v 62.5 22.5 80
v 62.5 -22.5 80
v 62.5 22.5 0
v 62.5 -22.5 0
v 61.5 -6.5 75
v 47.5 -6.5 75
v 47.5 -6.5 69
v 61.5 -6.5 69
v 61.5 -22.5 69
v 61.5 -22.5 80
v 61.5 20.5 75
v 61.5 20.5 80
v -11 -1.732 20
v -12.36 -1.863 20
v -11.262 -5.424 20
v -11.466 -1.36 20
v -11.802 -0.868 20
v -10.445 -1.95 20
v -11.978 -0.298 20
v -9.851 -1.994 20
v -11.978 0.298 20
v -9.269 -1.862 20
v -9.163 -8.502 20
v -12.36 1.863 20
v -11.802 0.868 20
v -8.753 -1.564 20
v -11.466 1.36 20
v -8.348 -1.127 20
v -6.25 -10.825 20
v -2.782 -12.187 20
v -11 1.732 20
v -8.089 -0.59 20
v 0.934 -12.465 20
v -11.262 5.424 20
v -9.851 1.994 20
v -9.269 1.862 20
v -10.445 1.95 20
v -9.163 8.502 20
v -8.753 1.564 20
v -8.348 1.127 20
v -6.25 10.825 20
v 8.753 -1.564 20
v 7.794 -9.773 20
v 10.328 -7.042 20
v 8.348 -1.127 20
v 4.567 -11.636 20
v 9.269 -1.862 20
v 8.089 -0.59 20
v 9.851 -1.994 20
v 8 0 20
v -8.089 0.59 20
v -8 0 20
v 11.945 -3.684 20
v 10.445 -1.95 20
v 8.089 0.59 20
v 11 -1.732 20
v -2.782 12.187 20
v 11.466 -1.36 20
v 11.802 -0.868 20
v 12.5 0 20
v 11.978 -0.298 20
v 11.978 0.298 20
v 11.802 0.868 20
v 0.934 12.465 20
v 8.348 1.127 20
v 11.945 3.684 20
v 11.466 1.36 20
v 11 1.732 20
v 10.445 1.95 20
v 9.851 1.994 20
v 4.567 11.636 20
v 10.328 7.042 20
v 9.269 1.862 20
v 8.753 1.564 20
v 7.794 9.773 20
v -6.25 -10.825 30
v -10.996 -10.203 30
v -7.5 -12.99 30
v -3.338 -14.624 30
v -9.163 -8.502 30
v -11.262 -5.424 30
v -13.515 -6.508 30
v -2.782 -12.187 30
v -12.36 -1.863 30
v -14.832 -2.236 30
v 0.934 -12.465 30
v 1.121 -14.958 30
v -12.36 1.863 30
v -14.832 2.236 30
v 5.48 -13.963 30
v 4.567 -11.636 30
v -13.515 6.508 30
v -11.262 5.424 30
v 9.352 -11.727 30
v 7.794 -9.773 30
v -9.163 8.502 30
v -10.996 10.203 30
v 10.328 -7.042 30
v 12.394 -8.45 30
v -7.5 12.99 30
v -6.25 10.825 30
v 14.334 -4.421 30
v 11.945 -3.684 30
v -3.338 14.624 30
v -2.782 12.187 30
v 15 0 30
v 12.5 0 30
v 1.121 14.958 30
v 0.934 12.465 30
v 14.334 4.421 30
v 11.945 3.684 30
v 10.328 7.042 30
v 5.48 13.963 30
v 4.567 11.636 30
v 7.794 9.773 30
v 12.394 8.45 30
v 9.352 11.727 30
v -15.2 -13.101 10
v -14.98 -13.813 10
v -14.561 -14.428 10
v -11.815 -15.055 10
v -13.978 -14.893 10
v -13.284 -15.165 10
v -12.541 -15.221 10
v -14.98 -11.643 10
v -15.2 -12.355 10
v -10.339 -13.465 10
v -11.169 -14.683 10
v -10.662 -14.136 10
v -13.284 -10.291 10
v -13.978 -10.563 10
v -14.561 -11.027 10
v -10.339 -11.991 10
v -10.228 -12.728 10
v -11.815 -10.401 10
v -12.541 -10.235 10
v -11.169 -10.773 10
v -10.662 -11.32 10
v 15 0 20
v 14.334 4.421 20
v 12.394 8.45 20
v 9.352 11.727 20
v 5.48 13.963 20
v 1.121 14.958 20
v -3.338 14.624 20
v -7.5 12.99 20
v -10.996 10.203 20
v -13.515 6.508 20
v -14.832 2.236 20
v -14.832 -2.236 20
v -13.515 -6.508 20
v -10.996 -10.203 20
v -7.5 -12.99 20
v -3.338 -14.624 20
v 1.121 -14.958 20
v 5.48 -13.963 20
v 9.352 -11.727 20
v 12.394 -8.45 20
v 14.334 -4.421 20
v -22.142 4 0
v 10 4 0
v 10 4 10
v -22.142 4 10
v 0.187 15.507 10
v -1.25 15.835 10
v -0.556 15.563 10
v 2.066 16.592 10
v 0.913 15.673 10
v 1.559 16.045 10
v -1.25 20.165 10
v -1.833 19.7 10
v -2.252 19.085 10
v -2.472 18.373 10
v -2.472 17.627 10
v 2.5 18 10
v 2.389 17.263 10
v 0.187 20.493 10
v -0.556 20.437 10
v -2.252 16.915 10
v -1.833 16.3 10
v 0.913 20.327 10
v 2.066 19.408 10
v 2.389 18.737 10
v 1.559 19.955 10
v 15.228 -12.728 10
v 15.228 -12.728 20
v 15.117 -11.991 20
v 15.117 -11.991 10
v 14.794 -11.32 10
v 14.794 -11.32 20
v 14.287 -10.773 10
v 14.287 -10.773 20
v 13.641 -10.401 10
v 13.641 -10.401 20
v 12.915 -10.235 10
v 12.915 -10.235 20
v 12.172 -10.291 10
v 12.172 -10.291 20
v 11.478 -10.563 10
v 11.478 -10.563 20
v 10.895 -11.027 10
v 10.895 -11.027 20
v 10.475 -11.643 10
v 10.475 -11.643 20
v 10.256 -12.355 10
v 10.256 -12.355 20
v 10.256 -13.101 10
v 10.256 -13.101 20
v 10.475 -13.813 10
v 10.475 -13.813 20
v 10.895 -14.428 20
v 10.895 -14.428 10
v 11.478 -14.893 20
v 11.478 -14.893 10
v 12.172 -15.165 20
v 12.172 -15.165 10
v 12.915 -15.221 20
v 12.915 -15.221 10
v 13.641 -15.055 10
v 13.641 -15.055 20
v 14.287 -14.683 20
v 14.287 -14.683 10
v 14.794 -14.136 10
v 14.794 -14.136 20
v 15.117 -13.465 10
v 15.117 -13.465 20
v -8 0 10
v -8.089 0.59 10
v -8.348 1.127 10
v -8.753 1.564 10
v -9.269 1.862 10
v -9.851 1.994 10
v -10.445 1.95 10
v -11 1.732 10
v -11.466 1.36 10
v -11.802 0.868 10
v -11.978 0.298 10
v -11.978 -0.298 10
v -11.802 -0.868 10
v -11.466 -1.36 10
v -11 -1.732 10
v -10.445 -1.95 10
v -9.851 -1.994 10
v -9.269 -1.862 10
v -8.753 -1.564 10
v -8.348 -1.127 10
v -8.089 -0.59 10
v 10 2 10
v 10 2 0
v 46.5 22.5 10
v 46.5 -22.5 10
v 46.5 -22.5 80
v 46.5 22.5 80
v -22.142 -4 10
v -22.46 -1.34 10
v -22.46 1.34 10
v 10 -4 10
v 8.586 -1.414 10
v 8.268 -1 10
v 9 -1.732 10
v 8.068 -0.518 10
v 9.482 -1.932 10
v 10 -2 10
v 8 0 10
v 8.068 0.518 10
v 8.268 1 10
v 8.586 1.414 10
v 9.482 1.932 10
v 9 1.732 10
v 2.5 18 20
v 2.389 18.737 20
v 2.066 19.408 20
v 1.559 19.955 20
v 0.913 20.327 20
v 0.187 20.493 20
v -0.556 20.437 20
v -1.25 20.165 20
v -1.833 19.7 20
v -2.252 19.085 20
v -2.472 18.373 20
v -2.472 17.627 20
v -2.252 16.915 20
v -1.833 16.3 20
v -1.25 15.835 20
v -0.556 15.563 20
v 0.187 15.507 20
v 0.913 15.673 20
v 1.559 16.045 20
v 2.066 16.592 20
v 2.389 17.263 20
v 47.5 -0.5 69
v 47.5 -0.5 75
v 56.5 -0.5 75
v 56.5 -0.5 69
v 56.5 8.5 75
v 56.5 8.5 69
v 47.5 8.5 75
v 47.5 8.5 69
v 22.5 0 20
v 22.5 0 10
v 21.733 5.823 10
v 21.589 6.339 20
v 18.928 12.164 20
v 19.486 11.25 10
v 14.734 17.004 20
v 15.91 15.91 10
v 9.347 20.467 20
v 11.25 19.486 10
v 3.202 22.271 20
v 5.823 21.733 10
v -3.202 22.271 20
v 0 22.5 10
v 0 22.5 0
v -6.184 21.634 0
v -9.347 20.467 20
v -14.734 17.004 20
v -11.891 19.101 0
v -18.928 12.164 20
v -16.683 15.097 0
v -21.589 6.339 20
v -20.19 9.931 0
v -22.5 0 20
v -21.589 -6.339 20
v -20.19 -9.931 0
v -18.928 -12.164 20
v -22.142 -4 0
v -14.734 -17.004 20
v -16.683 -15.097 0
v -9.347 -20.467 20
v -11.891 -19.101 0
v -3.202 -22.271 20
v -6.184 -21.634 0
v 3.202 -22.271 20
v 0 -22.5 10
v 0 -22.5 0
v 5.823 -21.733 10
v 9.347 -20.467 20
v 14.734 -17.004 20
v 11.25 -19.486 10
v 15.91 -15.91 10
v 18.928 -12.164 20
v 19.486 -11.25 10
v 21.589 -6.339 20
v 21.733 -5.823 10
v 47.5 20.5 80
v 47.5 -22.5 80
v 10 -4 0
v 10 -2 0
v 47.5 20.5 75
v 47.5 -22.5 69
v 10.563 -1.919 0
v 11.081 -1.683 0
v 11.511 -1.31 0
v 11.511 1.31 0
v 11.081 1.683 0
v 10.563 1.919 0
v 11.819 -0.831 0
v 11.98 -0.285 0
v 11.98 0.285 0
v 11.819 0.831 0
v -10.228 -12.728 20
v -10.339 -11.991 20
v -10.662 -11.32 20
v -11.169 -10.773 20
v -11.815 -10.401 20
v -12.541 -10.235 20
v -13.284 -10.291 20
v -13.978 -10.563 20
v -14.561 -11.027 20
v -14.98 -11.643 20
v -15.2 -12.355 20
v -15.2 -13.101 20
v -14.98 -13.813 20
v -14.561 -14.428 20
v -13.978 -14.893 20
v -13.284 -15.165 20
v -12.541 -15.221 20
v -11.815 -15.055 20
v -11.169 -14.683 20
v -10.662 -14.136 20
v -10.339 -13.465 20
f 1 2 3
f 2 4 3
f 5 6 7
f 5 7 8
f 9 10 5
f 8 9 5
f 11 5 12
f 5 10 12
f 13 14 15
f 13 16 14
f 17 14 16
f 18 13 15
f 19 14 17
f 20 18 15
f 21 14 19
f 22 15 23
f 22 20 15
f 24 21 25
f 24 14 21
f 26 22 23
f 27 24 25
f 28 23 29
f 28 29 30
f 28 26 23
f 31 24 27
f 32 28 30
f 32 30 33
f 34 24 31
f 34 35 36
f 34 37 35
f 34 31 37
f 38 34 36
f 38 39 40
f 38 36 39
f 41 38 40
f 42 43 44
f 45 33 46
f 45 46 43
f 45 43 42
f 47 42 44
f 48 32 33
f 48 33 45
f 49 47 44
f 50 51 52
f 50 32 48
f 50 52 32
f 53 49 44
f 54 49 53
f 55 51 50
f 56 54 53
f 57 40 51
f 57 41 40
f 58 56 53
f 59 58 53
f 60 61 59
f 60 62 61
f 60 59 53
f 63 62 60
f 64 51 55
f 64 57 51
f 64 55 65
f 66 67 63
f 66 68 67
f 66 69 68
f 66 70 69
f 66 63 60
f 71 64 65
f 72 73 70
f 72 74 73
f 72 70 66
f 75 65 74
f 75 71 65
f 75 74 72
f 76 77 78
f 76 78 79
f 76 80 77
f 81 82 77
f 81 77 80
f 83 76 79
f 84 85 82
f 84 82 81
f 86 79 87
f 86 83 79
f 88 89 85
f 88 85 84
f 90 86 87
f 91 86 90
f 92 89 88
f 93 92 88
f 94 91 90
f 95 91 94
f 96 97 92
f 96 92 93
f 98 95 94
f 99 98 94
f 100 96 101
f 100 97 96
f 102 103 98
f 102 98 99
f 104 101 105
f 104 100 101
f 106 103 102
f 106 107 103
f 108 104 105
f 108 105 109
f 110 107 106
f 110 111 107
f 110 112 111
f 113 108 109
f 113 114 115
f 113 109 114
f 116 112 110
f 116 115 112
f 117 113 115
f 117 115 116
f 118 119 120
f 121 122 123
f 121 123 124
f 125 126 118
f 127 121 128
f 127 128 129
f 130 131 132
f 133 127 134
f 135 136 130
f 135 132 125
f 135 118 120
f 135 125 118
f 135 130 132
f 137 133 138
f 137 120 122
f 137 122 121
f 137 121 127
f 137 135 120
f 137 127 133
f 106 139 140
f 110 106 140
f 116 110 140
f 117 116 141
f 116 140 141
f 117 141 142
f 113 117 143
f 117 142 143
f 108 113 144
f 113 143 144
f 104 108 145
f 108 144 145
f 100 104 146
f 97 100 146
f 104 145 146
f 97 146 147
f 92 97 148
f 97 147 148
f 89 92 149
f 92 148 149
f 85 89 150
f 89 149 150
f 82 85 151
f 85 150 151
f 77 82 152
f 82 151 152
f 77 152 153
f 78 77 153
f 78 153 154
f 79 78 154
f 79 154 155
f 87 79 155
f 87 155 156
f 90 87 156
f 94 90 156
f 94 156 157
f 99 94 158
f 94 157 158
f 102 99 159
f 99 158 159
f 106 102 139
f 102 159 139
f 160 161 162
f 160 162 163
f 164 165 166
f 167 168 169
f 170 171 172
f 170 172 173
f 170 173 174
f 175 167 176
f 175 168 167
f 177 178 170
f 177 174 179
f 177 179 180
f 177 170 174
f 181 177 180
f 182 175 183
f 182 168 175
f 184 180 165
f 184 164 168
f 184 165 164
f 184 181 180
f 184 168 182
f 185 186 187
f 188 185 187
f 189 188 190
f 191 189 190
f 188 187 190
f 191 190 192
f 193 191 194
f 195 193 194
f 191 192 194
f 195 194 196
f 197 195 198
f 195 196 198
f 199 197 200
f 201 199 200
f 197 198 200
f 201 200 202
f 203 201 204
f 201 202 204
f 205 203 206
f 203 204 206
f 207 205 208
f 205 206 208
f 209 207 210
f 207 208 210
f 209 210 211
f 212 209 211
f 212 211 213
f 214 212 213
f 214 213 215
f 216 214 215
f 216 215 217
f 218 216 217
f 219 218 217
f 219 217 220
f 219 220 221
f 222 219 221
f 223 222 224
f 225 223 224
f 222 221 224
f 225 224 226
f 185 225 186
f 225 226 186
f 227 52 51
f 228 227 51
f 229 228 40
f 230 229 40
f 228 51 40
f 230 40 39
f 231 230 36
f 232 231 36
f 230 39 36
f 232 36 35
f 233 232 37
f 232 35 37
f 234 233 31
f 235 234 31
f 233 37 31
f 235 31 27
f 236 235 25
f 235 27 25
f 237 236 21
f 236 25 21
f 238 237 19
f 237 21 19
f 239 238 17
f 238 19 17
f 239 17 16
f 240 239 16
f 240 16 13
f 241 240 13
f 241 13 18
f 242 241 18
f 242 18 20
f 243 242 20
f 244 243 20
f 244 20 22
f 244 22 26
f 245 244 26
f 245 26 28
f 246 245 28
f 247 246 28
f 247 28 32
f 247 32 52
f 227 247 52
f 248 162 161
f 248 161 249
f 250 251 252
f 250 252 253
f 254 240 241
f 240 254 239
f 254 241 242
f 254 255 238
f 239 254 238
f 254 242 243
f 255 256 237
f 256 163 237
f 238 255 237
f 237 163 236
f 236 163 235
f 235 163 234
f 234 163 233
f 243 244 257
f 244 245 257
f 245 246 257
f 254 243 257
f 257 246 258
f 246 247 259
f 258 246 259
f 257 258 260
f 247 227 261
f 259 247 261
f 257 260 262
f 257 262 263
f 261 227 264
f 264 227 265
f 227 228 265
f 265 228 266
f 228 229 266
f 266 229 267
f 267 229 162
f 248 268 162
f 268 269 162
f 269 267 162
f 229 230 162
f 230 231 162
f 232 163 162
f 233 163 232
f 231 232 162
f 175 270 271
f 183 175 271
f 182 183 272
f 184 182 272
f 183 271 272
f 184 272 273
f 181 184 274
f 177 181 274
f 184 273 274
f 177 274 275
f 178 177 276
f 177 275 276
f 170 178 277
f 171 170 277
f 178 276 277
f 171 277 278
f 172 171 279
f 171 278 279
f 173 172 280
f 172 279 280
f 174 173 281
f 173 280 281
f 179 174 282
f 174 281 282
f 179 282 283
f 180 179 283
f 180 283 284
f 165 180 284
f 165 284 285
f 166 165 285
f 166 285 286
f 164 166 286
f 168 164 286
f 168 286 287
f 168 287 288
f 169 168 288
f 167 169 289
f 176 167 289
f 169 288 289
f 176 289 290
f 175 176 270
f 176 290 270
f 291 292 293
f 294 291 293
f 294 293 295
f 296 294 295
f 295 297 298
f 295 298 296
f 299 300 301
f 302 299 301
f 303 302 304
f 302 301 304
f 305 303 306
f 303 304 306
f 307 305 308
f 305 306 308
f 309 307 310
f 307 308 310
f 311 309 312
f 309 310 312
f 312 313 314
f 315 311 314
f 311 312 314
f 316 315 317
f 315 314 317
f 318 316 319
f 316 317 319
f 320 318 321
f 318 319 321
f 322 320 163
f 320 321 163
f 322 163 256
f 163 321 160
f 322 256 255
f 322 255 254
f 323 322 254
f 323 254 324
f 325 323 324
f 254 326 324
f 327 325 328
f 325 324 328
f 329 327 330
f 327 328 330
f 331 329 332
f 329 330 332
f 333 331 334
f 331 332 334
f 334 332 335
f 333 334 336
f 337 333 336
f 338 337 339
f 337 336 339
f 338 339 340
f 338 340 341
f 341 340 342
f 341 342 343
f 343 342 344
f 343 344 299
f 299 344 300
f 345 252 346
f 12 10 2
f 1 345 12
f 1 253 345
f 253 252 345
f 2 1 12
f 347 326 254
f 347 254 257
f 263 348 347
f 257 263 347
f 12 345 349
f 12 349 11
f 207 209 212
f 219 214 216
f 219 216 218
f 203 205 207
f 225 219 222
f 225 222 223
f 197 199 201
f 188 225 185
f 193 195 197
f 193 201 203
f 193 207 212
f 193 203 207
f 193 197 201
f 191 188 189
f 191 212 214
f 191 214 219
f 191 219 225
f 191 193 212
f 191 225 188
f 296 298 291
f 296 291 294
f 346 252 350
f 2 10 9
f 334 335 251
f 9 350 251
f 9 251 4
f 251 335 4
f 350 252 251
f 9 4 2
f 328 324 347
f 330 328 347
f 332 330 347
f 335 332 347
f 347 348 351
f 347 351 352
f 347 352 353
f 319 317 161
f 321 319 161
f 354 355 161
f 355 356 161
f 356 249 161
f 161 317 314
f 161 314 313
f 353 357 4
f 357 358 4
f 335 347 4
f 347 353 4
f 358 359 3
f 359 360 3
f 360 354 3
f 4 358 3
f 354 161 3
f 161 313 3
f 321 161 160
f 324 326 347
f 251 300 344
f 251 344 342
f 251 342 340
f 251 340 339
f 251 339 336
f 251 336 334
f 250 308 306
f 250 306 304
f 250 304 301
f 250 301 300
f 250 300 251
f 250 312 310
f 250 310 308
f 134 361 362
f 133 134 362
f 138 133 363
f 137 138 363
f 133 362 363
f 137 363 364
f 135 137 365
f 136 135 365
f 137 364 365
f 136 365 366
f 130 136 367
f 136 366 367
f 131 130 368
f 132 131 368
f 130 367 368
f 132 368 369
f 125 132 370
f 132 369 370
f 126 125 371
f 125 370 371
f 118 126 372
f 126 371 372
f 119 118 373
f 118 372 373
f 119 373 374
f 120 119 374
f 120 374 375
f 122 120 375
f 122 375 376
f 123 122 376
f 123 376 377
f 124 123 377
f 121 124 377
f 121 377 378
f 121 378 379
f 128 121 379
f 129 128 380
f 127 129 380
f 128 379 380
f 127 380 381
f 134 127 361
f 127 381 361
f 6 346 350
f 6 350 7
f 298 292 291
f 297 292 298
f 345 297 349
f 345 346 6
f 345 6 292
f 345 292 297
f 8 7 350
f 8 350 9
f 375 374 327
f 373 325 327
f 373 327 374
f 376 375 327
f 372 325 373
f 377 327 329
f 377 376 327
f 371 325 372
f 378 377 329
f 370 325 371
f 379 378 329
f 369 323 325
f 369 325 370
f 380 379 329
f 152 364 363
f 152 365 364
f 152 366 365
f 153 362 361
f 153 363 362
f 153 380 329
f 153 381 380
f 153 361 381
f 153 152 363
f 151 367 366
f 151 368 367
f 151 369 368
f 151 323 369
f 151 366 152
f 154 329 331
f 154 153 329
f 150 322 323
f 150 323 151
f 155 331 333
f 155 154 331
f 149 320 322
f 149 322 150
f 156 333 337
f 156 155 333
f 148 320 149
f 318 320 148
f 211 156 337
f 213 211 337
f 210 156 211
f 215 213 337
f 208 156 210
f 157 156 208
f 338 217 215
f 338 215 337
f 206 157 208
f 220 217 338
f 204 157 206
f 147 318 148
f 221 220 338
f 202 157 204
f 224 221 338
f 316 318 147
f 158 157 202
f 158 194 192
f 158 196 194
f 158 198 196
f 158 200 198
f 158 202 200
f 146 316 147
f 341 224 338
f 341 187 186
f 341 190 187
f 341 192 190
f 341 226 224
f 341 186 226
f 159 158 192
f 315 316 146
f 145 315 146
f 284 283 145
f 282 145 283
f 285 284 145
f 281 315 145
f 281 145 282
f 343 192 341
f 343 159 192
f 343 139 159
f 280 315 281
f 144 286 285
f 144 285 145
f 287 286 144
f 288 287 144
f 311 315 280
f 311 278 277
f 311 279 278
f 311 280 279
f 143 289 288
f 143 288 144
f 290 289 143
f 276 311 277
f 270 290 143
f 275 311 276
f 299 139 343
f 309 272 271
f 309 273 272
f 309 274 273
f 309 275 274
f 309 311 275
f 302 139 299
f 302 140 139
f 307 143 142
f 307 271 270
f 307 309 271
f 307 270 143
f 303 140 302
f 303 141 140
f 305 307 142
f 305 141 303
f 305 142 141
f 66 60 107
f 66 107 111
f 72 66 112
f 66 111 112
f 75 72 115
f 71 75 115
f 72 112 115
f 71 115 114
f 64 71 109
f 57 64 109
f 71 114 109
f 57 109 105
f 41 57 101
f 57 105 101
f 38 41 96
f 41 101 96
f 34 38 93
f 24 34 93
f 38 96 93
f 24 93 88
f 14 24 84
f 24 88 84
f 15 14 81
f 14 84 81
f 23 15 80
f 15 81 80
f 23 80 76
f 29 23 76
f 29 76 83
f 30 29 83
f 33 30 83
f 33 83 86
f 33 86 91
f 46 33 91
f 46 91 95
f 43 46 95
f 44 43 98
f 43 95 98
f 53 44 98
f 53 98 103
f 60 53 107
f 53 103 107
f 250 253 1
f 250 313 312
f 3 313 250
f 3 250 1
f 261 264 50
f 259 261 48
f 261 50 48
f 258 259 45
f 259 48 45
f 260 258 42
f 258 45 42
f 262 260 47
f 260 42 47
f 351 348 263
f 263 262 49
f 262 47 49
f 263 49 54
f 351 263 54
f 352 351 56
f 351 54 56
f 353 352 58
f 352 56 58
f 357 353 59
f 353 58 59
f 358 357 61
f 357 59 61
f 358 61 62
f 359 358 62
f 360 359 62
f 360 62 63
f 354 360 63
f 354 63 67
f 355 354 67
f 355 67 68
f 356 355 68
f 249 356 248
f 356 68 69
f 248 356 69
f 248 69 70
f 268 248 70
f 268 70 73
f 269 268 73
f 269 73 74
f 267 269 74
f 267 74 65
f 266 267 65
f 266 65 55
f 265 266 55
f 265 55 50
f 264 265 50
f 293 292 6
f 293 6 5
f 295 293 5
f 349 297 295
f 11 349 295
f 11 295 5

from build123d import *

# Parameters (mm, degrees)
SKETCH1_R           = 22.5
BOSS_EXTRUDE1_DEPTH = 20
SKETCH11_W          = 62.5
SKETCH11_H          = 45
BOSS_EXTRUDE4_DEPTH = 10
SKETCH6_R           = 15
BOSS_EXTRUDE2_DEPTH = 10
SKETCH7_R           = 12.5
CUT_EXTRUDE1_DEPTH  = 10
SKETCH8_R           = 2
CUT_EXTRUDE3_DEPTH  = 70.372184628
SKETCH9_R           = 2.5
CUT_EXTRUDE4_DEPTH  = 10
SKETCH12_W          = 16
SKETCH12_H          = 45
BOSS_EXTRUDE5_DEPTH = 70
SKETCH13_W          = 14
SKETCH13_H          = 43
CUT_EXTRUDE5_DEPTH  = 5
SKETCH14_W          = 9
SKETCH14_H          = 9
SKETCH14_W_2        = 14
SKETCH14_H_2        = 16
CUT_EXTRUDE6_DEPTH  = 6
CUT_EXTRUDE7_DEPTH  = 10


with BuildPart() as part:
    # Sketch1 → Boss-Extrude1 (new body)
    with BuildSketch(Plane.XY):
        Circle(SKETCH1_R)
    extrude(amount=BOSS_EXTRUDE1_DEPTH)

    # Sketch11 → Boss-Extrude4 (add)
    with BuildSketch(Plane.XY):
        with Locations((31.25, 0)):
            Rectangle(SKETCH11_W, SKETCH11_H)
    extrude(amount=BOSS_EXTRUDE4_DEPTH)

    # Sketch6 → Boss-Extrude2 (add)
    with BuildSketch(Plane.XY.offset(20)):
        Circle(SKETCH6_R)
    extrude(amount=BOSS_EXTRUDE2_DEPTH)

    # Sketch7 → Cut-Extrude1 (cut)
    with BuildSketch(Plane.XY.offset(30)):
        Circle(SKETCH7_R)
    extrude(amount=-CUT_EXTRUDE1_DEPTH, mode=Mode.SUBTRACT)

    # Sketch8 → Cut-Extrude3 (cut, through all)
    with BuildSketch(Plane.XY.offset(20)):
        with Locations((-10, 0)):
            Circle(SKETCH8_R)
        with Locations((10, 0)):
            Circle(SKETCH8_R)
    extrude(amount=-CUT_EXTRUDE3_DEPTH, mode=Mode.SUBTRACT)

    # Sketch9 → Cut-Extrude4 (cut)
    with BuildSketch(Plane.XY.offset(20)):
        with Locations((0, 18)):
            Circle(SKETCH9_R)
        with Locations((-12.727922061, -12.727922061)):
            Circle(SKETCH9_R)
        with Locations((12.727922061, -12.727922061)):
            Circle(SKETCH9_R)
    extrude(amount=-CUT_EXTRUDE4_DEPTH, mode=Mode.SUBTRACT)

    # Sketch12 → Boss-Extrude5 (add)
    with BuildSketch(Plane.XY.offset(10)):
        with Locations((54.5, 0)):
            Rectangle(SKETCH12_W, SKETCH12_H)
    extrude(amount=BOSS_EXTRUDE5_DEPTH)

    # Sketch13 → Cut-Extrude5 (cut)
    with BuildSketch(Plane.XY.offset(80)):
        with Locations((54.5, -1)):
            Rectangle(SKETCH13_W, SKETCH13_H)
    extrude(amount=-CUT_EXTRUDE5_DEPTH, mode=Mode.SUBTRACT)

    # Sketch14 → Cut-Extrude6 (cut)
    with BuildSketch(Plane.XY.offset(75)):
        with Locations((52, 4)):
            Rectangle(SKETCH14_W, SKETCH14_H)
        with Locations((54.5, -14.5)):
            Rectangle(SKETCH14_W_2, SKETCH14_H_2)
    extrude(amount=-CUT_EXTRUDE6_DEPTH, mode=Mode.SUBTRACT)

    # Sketch17 → Cut-Extrude7 (cut)
    with BuildSketch(Plane(origin=(0, 0, 0), x_dir=(-1, 0, 0), z_dir=(0, 0, -1))):
        Polygon((-10, 2), (-10, 4), (24, 4), (24, -4), (-10, -4), (-10, -2), align=None)
    extrude(amount=-CUT_EXTRUDE7_DEPTH, mode=Mode.SUBTRACT)


solid = part.part
